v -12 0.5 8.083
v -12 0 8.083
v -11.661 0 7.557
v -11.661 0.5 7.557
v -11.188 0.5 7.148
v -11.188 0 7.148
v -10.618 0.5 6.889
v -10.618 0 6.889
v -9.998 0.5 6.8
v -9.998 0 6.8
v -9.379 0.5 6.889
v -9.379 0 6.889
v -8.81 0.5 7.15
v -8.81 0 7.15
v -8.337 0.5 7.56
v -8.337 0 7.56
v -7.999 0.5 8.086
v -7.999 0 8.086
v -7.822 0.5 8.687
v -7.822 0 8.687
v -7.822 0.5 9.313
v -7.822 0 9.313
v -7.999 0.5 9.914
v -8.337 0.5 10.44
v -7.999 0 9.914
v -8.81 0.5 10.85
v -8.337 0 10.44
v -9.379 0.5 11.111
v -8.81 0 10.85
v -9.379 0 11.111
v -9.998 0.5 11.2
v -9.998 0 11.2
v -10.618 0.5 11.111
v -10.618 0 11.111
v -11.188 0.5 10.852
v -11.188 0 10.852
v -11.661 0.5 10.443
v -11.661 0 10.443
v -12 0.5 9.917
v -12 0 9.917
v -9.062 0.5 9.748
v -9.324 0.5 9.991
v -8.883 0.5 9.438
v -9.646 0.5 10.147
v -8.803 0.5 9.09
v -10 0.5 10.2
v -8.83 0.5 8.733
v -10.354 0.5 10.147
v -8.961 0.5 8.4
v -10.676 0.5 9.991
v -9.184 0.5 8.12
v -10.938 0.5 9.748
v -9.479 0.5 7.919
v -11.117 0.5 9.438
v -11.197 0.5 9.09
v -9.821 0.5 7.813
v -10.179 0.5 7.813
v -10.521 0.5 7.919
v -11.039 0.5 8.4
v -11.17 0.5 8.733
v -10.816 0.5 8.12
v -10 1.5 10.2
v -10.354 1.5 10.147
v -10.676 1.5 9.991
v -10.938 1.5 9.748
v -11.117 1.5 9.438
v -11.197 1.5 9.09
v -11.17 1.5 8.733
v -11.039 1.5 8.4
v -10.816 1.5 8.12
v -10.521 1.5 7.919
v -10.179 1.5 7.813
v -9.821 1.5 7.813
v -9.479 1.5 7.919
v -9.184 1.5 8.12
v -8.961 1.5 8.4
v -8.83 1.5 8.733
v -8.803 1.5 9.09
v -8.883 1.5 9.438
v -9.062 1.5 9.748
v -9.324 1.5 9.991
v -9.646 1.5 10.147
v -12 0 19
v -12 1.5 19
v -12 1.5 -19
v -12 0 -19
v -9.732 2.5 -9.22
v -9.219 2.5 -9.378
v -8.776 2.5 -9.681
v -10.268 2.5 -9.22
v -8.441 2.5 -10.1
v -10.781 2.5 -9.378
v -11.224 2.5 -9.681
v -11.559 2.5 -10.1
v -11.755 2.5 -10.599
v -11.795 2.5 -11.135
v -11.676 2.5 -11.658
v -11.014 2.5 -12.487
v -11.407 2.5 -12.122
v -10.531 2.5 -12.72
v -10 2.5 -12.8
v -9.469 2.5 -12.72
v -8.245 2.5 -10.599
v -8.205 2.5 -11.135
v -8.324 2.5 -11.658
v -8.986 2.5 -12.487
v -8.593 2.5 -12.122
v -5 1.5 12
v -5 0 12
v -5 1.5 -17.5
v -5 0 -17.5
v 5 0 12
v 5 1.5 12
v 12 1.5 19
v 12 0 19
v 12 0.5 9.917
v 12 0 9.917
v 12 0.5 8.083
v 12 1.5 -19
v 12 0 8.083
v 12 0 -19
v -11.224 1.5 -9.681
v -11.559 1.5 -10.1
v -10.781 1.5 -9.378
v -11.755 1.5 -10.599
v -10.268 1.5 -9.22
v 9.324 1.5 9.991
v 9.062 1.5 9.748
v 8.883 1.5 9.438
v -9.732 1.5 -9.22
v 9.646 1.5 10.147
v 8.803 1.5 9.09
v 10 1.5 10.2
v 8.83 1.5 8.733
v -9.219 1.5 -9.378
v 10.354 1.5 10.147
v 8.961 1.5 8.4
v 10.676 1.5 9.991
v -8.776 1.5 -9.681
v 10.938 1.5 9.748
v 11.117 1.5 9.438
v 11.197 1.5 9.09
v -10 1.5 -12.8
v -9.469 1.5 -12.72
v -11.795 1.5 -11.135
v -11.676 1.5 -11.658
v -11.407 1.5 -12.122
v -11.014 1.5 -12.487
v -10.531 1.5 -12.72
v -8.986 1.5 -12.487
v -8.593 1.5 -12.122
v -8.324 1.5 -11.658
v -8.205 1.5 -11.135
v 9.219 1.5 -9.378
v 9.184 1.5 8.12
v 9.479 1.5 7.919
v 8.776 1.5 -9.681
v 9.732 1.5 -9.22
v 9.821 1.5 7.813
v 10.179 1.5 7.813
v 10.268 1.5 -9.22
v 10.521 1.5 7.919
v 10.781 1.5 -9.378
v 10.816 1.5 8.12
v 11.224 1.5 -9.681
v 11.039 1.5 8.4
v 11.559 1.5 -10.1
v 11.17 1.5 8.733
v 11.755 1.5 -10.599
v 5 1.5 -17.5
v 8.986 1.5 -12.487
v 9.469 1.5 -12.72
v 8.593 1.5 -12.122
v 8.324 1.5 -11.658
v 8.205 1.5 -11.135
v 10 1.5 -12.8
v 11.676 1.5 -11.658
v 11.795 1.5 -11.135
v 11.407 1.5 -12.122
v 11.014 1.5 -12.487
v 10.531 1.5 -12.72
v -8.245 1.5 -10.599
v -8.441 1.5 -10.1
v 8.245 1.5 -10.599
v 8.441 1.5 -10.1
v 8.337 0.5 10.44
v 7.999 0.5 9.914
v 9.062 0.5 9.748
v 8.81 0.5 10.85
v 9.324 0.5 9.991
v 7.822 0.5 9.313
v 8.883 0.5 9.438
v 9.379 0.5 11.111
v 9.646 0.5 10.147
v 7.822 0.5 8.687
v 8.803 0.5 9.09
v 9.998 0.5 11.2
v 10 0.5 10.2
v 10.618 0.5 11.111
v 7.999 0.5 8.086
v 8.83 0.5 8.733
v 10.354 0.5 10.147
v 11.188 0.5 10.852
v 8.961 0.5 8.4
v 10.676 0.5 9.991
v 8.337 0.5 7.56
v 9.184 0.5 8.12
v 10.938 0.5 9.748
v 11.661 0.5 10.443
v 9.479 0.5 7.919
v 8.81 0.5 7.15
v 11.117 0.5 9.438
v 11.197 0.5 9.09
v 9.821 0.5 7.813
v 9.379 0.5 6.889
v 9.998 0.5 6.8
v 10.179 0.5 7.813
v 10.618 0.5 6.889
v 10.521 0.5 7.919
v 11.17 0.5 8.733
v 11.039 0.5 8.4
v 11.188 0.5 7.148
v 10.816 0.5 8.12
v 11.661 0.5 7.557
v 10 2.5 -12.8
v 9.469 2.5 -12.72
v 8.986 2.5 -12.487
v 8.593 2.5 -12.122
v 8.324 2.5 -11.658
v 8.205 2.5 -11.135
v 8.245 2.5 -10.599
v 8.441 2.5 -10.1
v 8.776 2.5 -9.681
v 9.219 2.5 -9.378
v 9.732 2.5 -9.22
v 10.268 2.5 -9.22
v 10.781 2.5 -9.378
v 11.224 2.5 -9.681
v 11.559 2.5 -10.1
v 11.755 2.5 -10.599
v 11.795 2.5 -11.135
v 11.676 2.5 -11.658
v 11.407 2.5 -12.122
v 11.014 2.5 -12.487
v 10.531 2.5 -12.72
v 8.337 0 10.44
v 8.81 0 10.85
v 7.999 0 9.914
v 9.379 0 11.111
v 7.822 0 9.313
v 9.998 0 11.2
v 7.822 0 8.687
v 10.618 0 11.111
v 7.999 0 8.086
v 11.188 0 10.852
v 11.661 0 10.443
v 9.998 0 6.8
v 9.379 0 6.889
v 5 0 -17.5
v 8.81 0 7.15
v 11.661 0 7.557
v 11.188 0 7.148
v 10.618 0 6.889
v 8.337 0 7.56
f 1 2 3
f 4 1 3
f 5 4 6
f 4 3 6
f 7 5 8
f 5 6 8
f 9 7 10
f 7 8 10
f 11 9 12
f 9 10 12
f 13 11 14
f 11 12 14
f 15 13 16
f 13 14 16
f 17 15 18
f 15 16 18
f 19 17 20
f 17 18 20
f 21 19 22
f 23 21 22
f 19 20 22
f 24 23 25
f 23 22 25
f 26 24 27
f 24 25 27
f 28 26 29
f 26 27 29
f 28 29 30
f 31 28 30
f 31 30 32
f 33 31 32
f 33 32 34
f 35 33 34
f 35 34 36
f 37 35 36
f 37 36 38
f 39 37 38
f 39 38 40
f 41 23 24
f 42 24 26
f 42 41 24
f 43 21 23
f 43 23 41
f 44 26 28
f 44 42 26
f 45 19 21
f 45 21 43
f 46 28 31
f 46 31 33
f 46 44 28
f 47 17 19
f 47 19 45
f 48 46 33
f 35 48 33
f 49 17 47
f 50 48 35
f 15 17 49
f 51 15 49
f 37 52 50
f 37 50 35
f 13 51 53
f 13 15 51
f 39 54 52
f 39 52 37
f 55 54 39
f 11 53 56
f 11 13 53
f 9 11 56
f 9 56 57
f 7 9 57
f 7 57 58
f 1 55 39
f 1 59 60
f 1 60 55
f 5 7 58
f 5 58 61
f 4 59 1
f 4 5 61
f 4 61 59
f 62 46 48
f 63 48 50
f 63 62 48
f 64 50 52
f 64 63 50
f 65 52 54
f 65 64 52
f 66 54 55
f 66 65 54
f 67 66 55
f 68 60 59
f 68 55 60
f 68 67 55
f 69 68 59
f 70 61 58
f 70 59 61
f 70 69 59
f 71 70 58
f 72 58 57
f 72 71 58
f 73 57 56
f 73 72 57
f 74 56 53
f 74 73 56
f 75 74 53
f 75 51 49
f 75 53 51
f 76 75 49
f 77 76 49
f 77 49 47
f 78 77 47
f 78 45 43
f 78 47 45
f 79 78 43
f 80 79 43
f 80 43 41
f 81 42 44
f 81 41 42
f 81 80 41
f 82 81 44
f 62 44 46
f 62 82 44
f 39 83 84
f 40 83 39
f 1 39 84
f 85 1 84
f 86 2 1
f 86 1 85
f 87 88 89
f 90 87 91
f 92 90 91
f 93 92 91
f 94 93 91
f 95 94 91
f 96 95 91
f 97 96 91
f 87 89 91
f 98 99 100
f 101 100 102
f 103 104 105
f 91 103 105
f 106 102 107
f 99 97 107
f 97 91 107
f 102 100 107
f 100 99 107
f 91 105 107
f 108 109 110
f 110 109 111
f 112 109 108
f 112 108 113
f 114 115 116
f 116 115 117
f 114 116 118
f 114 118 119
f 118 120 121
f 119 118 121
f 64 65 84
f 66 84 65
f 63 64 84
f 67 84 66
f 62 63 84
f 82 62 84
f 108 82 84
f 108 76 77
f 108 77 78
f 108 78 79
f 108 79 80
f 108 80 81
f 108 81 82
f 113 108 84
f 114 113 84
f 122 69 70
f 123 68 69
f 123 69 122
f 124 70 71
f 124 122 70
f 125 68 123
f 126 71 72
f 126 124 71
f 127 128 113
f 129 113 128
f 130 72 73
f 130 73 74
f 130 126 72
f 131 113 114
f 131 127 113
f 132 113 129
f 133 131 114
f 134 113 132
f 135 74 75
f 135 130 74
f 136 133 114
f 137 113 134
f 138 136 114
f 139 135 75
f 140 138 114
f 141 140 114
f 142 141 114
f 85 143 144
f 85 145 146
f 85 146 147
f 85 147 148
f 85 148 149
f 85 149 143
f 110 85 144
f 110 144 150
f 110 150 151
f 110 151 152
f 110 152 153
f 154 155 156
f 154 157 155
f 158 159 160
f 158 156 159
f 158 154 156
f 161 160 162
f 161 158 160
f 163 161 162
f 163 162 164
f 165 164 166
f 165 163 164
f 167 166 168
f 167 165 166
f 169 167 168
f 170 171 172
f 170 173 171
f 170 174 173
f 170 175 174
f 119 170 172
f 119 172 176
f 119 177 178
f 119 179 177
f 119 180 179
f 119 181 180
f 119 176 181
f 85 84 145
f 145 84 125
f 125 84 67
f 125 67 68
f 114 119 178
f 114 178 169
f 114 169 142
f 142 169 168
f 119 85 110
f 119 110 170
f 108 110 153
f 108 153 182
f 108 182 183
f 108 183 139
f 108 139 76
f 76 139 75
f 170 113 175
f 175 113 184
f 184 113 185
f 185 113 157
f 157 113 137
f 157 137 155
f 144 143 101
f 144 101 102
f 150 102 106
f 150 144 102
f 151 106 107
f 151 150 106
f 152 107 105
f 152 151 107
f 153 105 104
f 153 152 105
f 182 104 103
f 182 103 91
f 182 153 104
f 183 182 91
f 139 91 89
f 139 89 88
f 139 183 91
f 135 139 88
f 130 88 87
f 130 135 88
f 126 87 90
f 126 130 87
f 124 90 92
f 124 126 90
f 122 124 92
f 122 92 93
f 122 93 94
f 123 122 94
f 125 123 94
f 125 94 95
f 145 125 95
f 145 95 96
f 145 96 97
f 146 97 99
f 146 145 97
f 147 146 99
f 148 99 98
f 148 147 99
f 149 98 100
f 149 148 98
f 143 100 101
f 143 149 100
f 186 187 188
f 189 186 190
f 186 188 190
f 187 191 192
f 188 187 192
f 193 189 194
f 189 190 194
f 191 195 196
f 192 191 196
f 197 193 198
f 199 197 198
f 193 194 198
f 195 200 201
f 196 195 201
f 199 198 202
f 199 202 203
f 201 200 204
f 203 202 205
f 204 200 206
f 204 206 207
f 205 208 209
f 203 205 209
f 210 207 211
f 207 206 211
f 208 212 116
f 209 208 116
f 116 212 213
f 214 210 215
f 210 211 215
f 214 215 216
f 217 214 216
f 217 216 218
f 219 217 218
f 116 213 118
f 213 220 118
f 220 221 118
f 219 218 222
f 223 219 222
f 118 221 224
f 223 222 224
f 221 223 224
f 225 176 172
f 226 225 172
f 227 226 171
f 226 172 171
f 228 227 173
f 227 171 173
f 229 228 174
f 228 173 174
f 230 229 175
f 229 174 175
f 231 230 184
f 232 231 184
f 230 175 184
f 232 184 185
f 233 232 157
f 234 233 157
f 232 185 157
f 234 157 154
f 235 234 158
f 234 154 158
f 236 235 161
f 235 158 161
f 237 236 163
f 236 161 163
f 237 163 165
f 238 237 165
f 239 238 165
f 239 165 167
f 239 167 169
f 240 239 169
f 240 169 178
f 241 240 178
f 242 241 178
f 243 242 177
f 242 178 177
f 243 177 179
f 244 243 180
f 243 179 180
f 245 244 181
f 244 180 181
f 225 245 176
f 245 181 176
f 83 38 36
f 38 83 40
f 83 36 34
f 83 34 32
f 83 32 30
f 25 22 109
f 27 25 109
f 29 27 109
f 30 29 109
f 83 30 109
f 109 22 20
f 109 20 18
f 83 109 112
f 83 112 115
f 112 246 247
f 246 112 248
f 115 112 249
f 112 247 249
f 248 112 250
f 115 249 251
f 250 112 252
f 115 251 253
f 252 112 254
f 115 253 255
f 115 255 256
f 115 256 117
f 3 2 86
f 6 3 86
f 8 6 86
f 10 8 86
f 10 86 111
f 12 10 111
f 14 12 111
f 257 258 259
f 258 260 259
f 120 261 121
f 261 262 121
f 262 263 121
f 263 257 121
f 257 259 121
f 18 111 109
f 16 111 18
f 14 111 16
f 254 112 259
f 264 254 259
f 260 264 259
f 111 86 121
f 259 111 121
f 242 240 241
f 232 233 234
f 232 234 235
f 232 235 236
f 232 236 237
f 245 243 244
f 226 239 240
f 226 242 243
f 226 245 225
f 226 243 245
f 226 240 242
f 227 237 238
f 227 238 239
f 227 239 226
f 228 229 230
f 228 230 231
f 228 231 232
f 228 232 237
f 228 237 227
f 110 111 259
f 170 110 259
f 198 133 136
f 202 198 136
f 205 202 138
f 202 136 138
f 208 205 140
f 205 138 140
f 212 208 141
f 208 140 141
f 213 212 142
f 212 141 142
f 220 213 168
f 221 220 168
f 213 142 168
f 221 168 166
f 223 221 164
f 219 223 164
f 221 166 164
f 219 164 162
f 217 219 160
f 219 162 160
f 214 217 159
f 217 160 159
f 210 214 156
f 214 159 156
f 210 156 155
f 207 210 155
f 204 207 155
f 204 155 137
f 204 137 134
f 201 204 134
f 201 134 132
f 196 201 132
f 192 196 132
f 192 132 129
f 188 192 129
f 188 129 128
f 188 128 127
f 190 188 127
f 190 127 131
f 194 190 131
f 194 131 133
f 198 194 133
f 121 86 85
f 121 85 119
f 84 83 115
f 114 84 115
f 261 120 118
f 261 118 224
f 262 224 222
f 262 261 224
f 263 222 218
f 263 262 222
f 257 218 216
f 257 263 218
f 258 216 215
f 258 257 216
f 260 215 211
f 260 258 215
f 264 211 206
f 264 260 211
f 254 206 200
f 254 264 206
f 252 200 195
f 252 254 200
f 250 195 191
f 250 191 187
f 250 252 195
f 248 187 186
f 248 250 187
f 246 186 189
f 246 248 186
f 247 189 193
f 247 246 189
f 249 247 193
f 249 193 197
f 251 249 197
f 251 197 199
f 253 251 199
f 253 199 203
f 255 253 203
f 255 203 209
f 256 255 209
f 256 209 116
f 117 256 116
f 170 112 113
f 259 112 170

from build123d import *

# Parameters (mm, degrees)
ESQUISSE1_W           = 24
ESQUISSE1_H           = 38
ESQUISSE1_W_2         = 10
ESQUISSE1_H_2         = 29.5
SHAPE_DEPTH           = 1.5
ESQUISSE2_R           = 1.2
VISHOLES_DEPTH        = 1.5
ESQUISSE3_R           = 1.8
LOCKERS_DEPTH         = 1
ESQUISSE4_R           = 2.2
SCREWHATREMOVER_DEPTH = 0.5


with BuildPart() as part:
    # Esquisse1 → Shape (new body)
    with BuildSketch(Plane(origin=(0, 0, 0), x_dir=(1, 0, 0), z_dir=(0, 1, 0))):
        Rectangle(ESQUISSE1_W, ESQUISSE1_H)
        with Locations((0, 2.75)):
            Rectangle(ESQUISSE1_W_2, ESQUISSE1_H_2, mode=Mode.SUBTRACT)
    extrude(amount=SHAPE_DEPTH)

    # Esquisse2 → VisHoles (cut)
    with BuildSketch(Plane(origin=(0, 1.5, 0), x_dir=(1, 0, 0), z_dir=(0, 1, 0))):
        with Locations(Location((10, -9, 0), (0, 0, 270))):
            Circle(ESQUISSE2_R)
    visholes = extrude(amount=-VISHOLES_DEPTH, mode=Mode.SUBTRACT)

    # Esquisse3 → Lockers (add)
    with BuildSketch(Plane(origin=(0, 1.5, 0), x_dir=(1, 0, 0), z_dir=(0, 1, 0))):
        with Locations(Location((10, 11, 0), (0, 0, 90))):
            Circle(ESQUISSE3_R)
    lockers = extrude(amount=LOCKERS_DEPTH)

    # Esquisse4 → ScrewHatRemover (cut)
    with BuildSketch(Plane(origin=(0, 0, 0), x_dir=(1, 0, 0), z_dir=(0, 1, 0))):
        with Locations((10, -9)):
            Circle(ESQUISSE4_R)
    screwhatremover = extrude(amount=SCREWHATREMOVER_DEPTH, mode=Mode.SUBTRACT)

    # Symétrie1: VisHoles, Lockers, ScrewHatRemover across plane
    add(visholes.mirror(Plane(origin=(0, 0, 0), x_dir=(0, 0, 1), z_dir=(1, 0, 0))), mode=Mode.SUBTRACT)
    add(lockers.mirror(Plane(origin=(0, 0, 0), x_dir=(0, 0, 1), z_dir=(1, 0, 0))))
    add(screwhatremover.mirror(Plane(origin=(0, 0, 0), x_dir=(0, 0, 1), z_dir=(1, 0, 0))), mode=Mode.SUBTRACT)


solid = part.part
